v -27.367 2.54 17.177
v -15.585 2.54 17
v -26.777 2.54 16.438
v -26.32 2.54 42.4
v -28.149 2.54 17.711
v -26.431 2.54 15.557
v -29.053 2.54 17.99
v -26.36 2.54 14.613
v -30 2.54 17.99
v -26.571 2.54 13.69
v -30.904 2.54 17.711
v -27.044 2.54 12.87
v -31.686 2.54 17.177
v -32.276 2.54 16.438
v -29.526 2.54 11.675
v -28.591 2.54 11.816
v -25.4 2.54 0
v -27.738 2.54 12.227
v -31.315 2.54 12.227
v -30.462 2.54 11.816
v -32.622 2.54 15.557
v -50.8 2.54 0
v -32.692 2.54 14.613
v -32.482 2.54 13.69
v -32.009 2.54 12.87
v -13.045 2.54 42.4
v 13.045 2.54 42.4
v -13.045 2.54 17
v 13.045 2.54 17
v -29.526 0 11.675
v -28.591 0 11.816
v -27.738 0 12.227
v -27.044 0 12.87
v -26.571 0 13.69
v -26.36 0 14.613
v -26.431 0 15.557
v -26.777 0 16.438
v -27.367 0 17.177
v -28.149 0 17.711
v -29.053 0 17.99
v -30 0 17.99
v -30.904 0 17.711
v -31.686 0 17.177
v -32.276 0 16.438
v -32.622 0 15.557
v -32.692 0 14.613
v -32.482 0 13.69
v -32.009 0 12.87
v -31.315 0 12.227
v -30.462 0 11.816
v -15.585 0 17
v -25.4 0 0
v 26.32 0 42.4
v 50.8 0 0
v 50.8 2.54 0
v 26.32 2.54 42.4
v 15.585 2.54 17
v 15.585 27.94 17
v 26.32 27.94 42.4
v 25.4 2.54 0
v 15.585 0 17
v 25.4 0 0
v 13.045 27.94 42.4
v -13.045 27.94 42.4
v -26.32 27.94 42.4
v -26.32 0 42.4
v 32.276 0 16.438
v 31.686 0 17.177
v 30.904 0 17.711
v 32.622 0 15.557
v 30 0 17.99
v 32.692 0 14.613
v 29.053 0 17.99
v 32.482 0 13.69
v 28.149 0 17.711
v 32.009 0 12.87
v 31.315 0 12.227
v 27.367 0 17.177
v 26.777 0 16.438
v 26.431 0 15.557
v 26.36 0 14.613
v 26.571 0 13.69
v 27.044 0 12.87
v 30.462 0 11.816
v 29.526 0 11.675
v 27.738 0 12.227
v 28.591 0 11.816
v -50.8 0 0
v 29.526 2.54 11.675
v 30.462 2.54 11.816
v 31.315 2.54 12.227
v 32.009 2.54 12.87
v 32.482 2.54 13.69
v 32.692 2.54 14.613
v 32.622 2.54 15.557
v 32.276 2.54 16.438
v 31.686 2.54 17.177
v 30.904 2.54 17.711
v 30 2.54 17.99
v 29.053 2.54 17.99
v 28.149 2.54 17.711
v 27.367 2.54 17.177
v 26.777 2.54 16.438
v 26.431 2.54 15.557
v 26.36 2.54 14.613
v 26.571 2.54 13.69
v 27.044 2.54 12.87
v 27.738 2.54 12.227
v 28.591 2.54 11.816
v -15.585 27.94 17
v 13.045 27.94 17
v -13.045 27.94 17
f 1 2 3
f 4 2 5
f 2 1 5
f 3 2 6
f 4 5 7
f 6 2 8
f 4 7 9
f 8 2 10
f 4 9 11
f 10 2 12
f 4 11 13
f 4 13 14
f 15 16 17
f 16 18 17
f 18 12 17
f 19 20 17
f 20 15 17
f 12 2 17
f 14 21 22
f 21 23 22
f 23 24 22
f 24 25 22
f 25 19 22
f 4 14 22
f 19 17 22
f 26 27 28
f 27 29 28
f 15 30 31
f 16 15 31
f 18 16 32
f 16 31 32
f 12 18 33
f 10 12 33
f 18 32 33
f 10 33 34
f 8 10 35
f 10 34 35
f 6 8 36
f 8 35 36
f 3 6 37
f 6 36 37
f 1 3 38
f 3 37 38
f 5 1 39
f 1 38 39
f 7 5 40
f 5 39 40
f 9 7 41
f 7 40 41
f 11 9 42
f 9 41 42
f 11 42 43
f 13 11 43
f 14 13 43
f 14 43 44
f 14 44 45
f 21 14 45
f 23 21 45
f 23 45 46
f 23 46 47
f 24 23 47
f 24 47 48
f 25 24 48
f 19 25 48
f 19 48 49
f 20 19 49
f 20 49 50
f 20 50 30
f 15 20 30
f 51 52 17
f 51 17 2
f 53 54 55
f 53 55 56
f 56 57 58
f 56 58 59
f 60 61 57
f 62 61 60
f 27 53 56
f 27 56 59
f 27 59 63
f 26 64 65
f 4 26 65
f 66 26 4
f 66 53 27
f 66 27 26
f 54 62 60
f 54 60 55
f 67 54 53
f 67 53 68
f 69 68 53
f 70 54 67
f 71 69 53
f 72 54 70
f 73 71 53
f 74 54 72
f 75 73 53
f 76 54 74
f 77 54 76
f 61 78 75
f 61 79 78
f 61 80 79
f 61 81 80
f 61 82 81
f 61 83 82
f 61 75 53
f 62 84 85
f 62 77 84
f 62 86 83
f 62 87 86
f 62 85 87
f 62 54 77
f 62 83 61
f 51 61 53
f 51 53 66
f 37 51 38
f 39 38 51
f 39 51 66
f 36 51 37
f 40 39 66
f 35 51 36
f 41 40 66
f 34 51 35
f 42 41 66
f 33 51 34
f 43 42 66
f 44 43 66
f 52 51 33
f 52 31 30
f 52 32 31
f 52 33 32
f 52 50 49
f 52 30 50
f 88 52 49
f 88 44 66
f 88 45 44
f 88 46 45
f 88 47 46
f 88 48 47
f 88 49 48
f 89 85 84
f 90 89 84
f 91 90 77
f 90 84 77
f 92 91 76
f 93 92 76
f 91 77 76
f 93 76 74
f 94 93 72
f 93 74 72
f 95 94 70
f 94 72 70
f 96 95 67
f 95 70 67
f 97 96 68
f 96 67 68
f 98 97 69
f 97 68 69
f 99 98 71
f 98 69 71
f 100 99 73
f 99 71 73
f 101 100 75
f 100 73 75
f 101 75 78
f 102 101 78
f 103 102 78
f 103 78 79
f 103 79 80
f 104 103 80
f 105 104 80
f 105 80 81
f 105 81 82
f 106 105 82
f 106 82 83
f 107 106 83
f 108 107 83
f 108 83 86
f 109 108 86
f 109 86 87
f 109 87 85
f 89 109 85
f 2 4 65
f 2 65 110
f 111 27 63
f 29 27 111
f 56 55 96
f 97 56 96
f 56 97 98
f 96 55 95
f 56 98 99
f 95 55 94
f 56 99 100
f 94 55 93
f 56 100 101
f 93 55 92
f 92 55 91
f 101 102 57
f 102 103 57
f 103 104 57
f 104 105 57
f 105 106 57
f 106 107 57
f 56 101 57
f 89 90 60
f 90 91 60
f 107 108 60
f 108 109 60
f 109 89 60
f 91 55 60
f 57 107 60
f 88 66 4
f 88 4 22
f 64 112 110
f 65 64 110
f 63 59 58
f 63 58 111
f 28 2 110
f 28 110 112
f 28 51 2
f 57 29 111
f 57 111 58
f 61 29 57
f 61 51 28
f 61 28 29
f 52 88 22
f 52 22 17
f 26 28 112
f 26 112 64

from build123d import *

# Parameters (mm, degrees)
BOSS_EXTRUDE1_DEPTH         = 2.54
BOSS_EXTRUDE2_DEPTH         = 25.4
F_1_4_0_25_DIAMETER_HOLE1_D = 6.35


with BuildPart() as part:
    # Sketch1 → Boss-Extrude1 (new body)
    with BuildSketch(Plane(origin=(0, 0, 0), x_dir=(1, 0, 0), z_dir=(0, 1, 0))):
        Polygon((-26.320348586, -42.4), (-50.8, 0), (-25.4, 0), (-15.585045424, -17), (15.585045424, -17), (25.4, 0), (50.8, 0), (26.320348586, -42.4), align=None)
    extrude(amount=BOSS_EXTRUDE1_DEPTH)

    # Sketch2 → Boss-Extrude2 (add)
    with BuildSketch(Plane(origin=(0, 2.54, 0), x_dir=(1, 0, 0), z_dir=(0, 1, 0))):
        Polygon((-26.320348586, -42.4), (-15.585045424, -17), (-13.045045424, -17), (-13.045045424, -42.4), align=None)
        Polygon((15.585045424, -17), (26.320348586, -42.4), (13.045045424, -42.4), (13.045045424, -17), align=None)
    extrude(amount=BOSS_EXTRUDE2_DEPTH)

    # 1/4 (0.25) Diameter Hole1 (through all)
    with Locations(Plane(origin=(29.526348503, 2.54, 14.85), x_dir=(0, 0, 1), z_dir=(0, 1, 0))):
        with Locations((0, 0), (0, -59.052697006)):
            Hole(F_1_4_0_25_DIAMETER_HOLE1_D / 2)


solid = part.part
